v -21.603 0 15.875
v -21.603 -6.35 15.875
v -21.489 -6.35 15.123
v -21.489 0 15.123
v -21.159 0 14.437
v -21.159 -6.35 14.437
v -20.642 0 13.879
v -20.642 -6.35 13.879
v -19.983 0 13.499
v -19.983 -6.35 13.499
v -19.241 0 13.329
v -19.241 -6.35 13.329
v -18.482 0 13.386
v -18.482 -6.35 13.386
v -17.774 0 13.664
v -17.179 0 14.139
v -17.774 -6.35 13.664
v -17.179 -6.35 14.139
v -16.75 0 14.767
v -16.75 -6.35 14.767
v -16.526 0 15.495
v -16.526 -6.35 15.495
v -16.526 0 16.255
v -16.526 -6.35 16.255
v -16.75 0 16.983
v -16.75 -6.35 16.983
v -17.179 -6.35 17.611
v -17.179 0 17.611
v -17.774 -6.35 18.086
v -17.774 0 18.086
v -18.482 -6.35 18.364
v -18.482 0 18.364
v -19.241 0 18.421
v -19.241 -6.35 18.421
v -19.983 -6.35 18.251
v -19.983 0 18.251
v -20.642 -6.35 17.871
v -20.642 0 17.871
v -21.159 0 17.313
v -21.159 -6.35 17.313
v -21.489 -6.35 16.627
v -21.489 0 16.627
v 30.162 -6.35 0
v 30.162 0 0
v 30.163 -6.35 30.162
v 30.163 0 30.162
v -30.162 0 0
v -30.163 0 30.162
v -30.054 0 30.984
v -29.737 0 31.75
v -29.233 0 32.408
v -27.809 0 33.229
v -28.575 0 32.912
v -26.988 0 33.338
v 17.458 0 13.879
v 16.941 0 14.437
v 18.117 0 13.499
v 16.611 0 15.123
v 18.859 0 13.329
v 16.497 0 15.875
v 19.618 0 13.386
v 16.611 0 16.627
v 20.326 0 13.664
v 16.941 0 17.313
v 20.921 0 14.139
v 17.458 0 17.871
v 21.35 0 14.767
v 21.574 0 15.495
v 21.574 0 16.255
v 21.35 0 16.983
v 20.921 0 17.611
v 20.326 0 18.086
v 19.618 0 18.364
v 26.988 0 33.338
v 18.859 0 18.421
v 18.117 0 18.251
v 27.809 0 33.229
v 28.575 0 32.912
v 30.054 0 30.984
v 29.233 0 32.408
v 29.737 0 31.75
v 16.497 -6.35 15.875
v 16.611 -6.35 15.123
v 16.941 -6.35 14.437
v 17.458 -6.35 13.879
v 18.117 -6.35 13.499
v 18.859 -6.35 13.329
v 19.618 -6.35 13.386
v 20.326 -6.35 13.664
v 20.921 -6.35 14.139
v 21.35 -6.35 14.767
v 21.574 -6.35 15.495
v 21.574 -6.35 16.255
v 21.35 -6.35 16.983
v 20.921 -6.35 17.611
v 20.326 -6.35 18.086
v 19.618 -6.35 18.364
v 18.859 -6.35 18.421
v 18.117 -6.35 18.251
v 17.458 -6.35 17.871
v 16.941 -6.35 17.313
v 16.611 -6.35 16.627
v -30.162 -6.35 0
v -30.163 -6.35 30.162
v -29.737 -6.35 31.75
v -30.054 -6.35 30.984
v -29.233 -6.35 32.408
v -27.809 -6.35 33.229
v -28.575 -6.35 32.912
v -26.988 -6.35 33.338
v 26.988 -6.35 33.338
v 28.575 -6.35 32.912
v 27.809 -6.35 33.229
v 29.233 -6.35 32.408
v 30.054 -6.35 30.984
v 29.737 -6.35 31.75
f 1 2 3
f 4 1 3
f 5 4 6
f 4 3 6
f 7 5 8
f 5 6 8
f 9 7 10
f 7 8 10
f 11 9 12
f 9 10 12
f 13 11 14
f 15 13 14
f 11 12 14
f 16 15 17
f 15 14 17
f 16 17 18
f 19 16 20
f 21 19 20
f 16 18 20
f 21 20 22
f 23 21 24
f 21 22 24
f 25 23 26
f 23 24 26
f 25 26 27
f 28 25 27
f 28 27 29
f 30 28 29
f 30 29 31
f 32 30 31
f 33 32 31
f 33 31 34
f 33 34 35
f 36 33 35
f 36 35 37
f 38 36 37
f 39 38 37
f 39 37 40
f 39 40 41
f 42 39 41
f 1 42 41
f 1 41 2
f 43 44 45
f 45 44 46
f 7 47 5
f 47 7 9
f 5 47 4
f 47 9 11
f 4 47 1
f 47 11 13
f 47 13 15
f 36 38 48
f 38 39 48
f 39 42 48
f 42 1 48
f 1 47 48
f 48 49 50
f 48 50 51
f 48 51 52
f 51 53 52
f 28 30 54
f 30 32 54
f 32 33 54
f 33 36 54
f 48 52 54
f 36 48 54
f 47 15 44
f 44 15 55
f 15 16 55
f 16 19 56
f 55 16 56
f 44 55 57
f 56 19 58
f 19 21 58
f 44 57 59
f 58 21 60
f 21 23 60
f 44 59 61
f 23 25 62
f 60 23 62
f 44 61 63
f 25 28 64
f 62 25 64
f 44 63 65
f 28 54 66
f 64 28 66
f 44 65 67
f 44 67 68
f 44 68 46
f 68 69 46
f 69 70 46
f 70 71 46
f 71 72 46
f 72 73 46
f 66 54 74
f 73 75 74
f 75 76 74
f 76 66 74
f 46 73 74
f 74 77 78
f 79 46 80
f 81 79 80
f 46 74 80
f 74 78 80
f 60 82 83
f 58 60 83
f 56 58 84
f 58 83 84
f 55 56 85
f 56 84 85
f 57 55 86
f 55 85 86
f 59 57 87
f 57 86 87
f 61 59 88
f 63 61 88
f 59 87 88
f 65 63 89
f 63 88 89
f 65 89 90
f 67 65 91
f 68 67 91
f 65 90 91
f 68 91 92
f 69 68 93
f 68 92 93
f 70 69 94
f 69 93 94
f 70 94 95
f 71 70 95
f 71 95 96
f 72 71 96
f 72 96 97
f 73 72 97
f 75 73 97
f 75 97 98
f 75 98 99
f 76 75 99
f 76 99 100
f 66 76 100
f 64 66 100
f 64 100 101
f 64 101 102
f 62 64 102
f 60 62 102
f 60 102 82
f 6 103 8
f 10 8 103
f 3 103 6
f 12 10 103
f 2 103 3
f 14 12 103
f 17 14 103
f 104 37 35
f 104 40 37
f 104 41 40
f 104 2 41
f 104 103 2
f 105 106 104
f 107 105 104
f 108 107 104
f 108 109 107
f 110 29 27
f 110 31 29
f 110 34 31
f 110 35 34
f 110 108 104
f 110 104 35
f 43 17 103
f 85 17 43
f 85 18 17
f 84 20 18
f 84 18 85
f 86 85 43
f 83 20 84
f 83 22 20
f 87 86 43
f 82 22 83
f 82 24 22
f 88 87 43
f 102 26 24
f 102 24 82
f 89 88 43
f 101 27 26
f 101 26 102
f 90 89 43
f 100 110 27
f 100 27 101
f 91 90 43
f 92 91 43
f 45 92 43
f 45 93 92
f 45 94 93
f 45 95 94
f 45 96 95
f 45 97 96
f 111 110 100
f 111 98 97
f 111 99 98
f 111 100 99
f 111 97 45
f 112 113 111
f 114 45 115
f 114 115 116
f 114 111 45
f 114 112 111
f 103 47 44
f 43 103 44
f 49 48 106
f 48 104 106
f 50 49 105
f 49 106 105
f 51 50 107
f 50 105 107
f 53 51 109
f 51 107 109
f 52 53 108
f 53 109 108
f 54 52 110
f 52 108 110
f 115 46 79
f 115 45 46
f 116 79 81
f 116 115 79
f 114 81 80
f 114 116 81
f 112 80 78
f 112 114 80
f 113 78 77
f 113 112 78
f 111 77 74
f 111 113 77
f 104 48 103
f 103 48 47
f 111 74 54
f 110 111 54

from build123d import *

# Parameters (mm, degrees)
F1_DEPTH = 6.35
F2_D     = 5.1054
F3_R     = 3.175


with BuildPart() as f1:
    # F0 (on Front) → F1 (new body)
    with BuildSketch(Plane.XZ):
        Polygon((-30.1625, 0), (0, 0), (30.1625, 0), (30.1625, 33.3375), (0, 33.3375), (-30.1625, 33.3375), align=None)
    extrude(amount=F1_DEPTH)

    # F2 (through all)
    with Locations(Plane(origin=(0, 0, 0), x_dir=(1, 0, 0), z_dir=(0, 1, 0))):
        with Locations((-19.05, -15.875), (19.05, -15.875)):
            Hole(F2_D / 2)

    # F3
    f3_edges = [f1.edges().sort_by_distance(p)[0] for p in [
        (-30.1625, -3.175, 33.3375),
        (30.1625, -3.175, 33.3375),
    ]]
    fillet(f3_edges, radius=F3_R)


solid = f1.part
